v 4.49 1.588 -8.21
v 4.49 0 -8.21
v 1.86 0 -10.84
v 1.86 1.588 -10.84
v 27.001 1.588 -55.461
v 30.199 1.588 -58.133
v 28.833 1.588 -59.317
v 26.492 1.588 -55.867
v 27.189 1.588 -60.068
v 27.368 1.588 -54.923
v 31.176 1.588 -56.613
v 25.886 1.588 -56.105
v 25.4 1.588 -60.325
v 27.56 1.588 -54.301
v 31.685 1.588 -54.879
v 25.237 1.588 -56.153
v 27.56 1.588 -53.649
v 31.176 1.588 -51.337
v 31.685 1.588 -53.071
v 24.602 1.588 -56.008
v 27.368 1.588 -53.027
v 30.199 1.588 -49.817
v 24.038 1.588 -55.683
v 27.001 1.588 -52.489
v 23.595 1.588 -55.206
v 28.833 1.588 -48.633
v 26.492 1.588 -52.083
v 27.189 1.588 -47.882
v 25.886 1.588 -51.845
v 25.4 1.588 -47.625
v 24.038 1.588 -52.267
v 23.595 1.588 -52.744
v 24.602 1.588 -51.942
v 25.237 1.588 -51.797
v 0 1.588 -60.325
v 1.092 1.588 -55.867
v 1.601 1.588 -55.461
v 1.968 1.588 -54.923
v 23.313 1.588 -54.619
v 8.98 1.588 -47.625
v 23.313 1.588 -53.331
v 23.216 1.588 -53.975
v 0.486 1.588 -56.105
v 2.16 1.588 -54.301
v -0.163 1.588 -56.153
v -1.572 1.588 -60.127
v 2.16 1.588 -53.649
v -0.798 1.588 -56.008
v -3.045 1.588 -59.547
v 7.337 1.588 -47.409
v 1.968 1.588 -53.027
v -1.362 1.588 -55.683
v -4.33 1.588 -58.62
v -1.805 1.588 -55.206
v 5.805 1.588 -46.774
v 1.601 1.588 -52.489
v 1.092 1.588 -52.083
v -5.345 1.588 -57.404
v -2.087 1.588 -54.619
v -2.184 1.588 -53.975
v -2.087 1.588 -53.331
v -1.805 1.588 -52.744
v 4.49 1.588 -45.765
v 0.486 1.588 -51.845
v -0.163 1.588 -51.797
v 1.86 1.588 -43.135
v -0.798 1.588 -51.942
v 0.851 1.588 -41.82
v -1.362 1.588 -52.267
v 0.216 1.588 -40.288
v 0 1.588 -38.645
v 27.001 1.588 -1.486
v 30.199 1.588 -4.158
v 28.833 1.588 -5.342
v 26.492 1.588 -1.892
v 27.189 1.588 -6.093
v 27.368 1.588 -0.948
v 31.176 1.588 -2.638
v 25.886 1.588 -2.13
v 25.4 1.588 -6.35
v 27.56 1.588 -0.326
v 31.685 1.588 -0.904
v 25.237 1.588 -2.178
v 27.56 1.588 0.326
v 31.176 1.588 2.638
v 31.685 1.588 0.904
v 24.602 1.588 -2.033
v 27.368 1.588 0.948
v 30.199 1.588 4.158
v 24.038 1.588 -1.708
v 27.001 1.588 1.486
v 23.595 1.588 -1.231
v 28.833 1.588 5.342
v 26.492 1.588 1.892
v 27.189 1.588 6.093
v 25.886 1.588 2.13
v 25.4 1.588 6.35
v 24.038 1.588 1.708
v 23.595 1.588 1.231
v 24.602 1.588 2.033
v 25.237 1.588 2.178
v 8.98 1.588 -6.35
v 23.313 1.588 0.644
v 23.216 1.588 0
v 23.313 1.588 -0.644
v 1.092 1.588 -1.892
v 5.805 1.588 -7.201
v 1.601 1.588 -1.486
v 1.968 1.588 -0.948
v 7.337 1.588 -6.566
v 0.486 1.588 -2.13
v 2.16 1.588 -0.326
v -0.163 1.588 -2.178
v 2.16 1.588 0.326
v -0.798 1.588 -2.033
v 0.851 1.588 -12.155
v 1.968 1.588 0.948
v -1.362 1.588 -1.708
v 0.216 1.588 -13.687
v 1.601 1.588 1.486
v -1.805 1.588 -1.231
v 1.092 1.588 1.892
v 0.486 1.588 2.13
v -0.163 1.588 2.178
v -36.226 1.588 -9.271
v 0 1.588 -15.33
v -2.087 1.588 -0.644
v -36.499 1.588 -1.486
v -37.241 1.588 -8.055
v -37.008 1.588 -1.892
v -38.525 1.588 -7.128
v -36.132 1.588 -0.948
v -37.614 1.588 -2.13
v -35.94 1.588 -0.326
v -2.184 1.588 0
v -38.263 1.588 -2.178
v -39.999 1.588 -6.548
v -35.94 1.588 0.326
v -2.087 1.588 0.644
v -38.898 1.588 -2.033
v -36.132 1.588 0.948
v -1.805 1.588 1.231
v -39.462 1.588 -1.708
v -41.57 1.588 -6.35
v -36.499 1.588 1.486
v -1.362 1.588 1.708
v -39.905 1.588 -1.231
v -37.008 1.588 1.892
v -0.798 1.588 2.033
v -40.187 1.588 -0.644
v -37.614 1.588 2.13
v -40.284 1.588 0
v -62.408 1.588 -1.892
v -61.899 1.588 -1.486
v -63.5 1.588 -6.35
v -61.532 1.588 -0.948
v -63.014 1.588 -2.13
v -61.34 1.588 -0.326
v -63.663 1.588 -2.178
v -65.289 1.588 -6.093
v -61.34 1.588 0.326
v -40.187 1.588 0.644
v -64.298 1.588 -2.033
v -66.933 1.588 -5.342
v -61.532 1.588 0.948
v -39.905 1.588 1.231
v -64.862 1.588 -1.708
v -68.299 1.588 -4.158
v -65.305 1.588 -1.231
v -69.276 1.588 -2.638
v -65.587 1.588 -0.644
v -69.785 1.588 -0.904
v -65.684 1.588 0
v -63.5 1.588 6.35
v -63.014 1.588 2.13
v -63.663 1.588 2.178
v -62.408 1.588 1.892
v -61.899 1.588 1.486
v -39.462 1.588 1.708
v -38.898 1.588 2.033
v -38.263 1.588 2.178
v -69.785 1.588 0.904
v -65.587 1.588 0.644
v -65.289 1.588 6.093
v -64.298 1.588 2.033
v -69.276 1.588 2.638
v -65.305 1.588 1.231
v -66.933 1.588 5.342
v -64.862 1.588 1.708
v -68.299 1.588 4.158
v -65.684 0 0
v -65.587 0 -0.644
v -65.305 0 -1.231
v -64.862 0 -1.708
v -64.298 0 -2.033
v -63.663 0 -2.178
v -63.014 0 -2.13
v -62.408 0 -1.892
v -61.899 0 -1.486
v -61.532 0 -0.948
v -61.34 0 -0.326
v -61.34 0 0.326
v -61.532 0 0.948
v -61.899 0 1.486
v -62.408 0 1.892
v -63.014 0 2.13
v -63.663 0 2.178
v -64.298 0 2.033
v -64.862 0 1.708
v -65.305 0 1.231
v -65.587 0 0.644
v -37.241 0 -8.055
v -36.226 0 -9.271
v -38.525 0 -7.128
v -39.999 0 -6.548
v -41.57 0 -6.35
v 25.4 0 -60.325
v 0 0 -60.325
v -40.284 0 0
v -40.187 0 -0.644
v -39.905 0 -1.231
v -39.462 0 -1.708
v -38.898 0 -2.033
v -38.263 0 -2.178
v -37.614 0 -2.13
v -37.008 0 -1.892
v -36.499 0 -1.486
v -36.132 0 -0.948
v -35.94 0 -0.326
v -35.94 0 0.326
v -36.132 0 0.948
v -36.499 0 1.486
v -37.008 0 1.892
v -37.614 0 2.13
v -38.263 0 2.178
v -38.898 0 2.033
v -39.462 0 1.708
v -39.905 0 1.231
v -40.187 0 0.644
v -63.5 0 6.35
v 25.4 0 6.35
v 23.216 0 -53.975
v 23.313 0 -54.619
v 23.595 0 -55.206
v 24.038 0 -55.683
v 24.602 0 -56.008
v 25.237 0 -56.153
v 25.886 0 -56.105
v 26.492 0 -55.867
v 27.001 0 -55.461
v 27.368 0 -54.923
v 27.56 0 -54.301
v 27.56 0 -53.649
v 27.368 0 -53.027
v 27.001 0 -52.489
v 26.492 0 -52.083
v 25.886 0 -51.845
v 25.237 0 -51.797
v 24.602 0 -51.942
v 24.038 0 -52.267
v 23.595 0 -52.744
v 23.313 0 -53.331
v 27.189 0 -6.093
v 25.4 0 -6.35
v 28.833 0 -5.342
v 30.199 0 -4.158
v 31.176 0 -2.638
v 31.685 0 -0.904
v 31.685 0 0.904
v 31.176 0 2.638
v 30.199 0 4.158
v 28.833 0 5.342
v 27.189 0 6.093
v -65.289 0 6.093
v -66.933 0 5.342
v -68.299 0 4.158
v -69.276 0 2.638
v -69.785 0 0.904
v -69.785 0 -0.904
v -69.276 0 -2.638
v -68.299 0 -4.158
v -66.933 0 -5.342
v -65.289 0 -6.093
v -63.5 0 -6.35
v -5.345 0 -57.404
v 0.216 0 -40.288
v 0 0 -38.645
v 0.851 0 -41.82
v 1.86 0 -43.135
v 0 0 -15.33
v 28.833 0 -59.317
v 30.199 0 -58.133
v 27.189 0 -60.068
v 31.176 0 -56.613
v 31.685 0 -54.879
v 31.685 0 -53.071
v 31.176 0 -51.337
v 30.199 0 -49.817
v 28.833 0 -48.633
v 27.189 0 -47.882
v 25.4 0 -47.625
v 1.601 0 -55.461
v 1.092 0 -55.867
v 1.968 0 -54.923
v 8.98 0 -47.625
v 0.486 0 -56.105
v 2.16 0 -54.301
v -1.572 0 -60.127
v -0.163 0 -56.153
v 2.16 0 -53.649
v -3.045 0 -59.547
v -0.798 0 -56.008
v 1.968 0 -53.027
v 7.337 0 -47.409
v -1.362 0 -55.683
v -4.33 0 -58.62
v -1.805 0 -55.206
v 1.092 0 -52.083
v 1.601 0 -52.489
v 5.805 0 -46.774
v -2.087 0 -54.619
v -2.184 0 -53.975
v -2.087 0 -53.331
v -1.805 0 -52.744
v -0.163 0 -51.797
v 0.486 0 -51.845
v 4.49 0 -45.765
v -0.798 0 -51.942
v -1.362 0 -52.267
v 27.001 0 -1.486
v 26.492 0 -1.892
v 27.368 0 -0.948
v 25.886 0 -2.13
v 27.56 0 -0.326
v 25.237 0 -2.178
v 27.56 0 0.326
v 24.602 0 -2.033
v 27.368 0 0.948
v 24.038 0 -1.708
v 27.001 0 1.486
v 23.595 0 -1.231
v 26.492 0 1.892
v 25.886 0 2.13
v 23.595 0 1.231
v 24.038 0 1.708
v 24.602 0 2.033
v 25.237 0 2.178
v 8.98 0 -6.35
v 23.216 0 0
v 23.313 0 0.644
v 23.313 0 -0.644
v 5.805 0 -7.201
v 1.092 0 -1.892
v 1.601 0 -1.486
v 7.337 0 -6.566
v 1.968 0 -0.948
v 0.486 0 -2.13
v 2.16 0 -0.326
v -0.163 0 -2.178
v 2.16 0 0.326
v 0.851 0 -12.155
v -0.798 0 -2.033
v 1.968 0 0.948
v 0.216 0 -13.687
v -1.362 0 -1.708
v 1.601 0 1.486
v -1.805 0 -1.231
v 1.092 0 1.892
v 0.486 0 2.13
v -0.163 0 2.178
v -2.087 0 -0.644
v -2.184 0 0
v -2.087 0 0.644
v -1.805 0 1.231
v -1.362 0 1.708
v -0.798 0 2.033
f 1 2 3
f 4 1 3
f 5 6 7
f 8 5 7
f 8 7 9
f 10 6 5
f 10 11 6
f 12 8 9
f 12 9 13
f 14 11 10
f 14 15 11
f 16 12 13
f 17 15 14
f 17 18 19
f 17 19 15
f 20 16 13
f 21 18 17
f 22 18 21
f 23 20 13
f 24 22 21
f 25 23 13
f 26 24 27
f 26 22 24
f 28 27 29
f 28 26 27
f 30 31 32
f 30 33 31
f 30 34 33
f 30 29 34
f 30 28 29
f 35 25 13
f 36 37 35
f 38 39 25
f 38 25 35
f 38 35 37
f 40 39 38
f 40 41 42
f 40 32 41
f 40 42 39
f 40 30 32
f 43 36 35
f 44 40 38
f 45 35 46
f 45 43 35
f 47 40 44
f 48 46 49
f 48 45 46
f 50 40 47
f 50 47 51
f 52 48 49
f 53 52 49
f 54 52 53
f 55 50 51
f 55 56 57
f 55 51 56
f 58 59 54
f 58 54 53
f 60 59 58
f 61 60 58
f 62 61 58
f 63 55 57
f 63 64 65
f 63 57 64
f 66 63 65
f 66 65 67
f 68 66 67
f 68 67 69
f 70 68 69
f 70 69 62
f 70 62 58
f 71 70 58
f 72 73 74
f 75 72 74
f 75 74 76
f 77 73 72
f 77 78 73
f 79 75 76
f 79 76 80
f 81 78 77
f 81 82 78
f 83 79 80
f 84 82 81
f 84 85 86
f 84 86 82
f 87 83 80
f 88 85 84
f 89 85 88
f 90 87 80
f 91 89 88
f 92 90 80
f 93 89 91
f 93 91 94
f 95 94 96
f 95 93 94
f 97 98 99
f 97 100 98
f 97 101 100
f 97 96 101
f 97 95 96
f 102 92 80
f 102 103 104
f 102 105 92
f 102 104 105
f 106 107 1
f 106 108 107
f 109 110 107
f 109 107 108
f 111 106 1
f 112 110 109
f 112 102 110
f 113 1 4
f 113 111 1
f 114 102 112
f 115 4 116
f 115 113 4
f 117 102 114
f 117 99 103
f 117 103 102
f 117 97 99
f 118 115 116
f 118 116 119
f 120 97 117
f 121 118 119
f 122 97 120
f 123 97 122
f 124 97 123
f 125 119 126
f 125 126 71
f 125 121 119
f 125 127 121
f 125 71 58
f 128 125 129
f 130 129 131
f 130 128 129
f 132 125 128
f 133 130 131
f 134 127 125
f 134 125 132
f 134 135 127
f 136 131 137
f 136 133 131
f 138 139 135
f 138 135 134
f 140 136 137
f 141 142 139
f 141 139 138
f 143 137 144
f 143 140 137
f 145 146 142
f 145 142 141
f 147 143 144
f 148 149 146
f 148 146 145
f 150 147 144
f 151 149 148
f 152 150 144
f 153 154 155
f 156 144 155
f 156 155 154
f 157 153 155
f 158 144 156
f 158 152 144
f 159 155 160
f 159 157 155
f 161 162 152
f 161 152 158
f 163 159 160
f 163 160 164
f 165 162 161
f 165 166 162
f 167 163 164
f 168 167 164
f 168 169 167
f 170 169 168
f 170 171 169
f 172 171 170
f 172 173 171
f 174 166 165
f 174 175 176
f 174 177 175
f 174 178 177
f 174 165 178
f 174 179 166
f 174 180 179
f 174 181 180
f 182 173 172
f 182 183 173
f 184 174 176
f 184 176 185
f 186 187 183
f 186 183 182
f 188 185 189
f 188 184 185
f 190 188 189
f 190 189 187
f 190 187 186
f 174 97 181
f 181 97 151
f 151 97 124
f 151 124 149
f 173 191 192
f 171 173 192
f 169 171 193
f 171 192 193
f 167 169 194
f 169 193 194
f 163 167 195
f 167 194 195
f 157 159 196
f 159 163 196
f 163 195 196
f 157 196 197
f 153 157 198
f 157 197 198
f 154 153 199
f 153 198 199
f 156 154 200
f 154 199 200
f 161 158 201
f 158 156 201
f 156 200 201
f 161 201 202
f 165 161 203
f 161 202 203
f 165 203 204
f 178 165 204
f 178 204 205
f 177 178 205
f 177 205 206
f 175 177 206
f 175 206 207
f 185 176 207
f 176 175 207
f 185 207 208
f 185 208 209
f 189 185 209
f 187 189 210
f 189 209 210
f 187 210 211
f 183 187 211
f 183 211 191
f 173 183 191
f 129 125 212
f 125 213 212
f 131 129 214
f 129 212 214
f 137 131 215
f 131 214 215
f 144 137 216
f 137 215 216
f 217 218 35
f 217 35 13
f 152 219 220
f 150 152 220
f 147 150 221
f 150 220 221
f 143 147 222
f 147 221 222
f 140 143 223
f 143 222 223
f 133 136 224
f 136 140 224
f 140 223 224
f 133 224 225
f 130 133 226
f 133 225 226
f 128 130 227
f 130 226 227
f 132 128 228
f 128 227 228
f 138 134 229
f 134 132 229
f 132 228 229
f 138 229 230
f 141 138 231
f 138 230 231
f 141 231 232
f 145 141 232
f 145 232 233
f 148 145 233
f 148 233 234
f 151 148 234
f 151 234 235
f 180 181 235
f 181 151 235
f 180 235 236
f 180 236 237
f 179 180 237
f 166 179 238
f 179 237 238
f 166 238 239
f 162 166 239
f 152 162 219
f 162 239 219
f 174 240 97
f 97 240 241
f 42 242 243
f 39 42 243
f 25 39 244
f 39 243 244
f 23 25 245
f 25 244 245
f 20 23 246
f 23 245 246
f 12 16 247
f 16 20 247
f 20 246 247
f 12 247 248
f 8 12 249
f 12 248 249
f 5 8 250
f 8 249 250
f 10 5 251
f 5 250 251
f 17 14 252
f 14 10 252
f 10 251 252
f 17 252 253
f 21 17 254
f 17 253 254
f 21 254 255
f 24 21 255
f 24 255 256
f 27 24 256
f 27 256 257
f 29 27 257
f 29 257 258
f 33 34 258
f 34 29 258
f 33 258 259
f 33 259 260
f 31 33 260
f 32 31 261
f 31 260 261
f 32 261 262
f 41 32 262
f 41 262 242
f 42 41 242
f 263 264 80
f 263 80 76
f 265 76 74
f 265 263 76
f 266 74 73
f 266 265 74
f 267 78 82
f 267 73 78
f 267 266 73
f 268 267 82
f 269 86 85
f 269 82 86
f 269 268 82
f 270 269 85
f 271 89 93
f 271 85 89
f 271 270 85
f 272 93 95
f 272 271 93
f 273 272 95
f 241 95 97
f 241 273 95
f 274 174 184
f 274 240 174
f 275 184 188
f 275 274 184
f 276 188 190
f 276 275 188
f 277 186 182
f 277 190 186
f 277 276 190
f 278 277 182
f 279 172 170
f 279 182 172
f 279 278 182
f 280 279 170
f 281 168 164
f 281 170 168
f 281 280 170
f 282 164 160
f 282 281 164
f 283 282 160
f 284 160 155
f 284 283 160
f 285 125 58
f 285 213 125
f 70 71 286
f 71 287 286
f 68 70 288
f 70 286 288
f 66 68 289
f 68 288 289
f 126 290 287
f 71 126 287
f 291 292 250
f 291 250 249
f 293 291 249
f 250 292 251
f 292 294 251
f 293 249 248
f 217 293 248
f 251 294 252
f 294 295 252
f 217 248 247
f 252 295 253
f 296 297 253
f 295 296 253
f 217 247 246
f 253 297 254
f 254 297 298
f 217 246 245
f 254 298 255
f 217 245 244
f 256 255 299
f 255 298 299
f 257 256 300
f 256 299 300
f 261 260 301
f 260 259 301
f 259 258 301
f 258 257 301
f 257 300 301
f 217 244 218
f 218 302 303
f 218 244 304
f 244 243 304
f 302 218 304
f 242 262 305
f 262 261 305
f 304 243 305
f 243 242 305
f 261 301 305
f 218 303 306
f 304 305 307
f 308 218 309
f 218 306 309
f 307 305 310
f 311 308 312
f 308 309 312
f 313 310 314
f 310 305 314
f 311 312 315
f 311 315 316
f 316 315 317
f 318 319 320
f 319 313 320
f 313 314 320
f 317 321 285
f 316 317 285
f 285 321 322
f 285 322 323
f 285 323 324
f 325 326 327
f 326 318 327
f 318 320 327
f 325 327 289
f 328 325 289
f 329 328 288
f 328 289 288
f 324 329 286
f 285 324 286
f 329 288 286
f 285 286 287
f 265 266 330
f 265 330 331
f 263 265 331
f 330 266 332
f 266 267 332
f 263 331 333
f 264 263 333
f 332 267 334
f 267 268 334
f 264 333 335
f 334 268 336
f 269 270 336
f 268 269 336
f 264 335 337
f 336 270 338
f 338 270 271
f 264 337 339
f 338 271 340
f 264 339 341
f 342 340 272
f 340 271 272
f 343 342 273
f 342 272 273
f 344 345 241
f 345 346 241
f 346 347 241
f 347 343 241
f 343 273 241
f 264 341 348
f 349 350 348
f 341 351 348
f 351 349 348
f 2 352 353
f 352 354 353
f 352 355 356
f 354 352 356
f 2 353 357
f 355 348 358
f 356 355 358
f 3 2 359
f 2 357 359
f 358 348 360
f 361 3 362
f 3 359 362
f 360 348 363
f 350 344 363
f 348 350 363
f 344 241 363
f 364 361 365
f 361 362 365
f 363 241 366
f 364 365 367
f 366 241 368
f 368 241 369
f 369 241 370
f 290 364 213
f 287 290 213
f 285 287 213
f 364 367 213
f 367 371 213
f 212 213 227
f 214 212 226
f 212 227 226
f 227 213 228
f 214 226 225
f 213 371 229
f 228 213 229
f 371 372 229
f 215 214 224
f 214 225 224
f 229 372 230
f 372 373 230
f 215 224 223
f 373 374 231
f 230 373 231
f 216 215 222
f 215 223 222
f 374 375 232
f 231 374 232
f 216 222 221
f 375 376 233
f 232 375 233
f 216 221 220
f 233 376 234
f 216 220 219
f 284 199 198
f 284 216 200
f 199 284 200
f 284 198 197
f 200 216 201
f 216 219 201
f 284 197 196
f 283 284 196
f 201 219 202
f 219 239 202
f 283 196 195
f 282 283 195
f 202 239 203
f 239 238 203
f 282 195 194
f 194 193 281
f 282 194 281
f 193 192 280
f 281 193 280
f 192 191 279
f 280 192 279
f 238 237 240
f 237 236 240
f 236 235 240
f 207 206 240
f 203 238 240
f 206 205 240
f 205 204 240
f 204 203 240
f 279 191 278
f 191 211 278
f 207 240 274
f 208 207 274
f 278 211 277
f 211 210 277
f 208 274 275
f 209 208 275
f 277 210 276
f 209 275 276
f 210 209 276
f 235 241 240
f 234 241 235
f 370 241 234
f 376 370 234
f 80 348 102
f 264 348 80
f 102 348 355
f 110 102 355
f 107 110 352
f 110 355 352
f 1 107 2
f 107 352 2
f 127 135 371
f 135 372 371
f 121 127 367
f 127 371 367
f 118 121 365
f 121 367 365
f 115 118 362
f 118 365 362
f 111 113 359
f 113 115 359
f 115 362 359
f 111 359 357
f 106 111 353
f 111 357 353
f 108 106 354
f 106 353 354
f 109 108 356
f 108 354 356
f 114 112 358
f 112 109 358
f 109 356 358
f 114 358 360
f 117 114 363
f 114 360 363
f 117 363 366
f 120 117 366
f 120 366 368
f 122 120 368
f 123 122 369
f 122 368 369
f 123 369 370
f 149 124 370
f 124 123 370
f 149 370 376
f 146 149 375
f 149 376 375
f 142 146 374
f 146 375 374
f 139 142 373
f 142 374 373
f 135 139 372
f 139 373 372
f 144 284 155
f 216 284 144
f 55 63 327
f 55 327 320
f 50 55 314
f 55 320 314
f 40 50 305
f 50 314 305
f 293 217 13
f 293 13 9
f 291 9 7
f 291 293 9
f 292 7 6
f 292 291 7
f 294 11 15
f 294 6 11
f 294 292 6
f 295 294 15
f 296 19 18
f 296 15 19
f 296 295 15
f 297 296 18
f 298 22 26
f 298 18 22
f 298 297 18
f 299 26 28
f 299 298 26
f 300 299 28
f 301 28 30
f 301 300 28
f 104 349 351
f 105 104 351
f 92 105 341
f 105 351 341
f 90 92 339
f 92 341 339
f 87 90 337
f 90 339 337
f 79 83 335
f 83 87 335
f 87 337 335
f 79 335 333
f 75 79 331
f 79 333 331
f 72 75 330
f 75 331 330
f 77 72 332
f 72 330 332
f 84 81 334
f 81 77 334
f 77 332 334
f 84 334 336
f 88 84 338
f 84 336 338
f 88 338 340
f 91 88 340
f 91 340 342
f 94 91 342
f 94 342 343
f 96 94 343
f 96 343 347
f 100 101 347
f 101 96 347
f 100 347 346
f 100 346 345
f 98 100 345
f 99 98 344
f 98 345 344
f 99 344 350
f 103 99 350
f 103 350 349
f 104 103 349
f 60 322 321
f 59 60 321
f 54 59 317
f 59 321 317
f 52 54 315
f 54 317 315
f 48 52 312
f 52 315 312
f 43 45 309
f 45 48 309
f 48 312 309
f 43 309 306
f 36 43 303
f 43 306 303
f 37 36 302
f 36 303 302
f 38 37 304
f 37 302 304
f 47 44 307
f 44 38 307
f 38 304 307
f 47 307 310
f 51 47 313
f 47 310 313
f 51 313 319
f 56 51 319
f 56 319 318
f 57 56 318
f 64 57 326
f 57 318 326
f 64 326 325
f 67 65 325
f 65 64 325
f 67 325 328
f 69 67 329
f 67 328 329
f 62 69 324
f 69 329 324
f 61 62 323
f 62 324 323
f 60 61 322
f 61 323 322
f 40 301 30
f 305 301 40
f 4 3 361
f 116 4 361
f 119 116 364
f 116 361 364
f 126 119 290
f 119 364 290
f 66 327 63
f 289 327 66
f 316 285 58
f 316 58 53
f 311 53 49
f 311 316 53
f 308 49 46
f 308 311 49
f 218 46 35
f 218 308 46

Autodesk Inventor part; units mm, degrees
ref_plane "YZ Plane" through (0, 0, 0) normal (1, 0, 0) x (0, 1, 0)
ref_plane "XZ Plane" through (0, 0, 0) normal (0, 1, 0) x (-1, 0, 0)
ref_plane "XY Plane" through (0, 0, 0) normal (0, 0, 1) x (1, 0, 0)
sketch "main" plane through (0, 0, 0) normal (0, 0, 1) x (1, 0, 0)
  circle A0 centre (-18.4512, -23.1863) radius 2.1844
  line L0 (-22.9413, -14.9764) -> (-20.311, -12.3462)
  line L1 (-43.8512, -16.8363) -> (-27.4314, -16.8363)
  arc A1 (-27.4314, -16.8363) -> (-22.9413, -14.9764) centre (-27.4314, -10.4863) ccw
  circle A2 centre (-43.8512, -23.1863) radius 2.1844
  arc A3 (-43.8512, -16.8363) -> (-43.8512, -29.5363) centre (-43.8512, -23.1863) ccw
  arc A4 (-20.311, -12.3462) -> (-18.4512, -7.856) centre (-24.8012, -7.856) ccw
  line L2 (-18.4512, 15.4585) -> (-18.4512, -7.856)
  line L3 (17.7748, 21.5177) -> (-13.1066, -26.6153)
  arc A5 (-18.4512, 15.4585) -> (-20.311, 19.9486) centre (-24.8012, 15.4585) ccw
  line L4 (-22.9413, 22.5788) -> (-20.311, 19.9486)
  arc A6 (-22.9413, 22.5788) -> (-27.4314, 24.4387) centre (-27.4314, 18.0887) ccw
  circle A7 centre (-43.8512, 30.7887) radius 2.1844
  circle A8 centre (-18.4512, 30.7887) radius 2.1844
  circle A9 centre (19.6488, 30.7887) radius 2.1844
  line L5 (45.0488, 37.1387) -> (-43.8512, 37.1387)
  line L6 (-27.4314, 24.4387) -> (-43.8512, 24.4387)
  arc A10 (-43.8512, 37.1387) -> (-43.8512, 24.4387) centre (-43.8512, 30.7887) ccw
  arc A11 (23.1193, 24.4387) -> (17.7748, 21.5177) centre (23.1193, 18.0887) ccw
  line L7 (45.0488, 24.4387) -> (23.1193, 24.4387)
  circle A12 centre (45.0488, 30.7887) radius 2.1844
  arc A13 (45.0488, 24.4387) -> (45.0488, 37.1387) centre (45.0488, 30.7887) ccw
  line L8 (-18.4512, -29.5363) -> (-43.8512, -29.5363)
  arc A14 (-18.4512, -29.5363) -> (-13.1066, -26.6153) centre (-18.4512, -23.1863) ccw
  point P0 (-14.0637, 6.8091)
  dimension "d0" = 6.35
  dimension "d1" = 6.35
sketch "Sketch1" plane through (0, 0, 0) normal (0, 1, 0) x (-1, 0, 0)
  circle A0 centre (0, -53.975) radius 2.1844
  line L0 (-4.4901, -45.7651) -> (-1.8599, -43.1349)
  line L1 (-25.4, -47.625) -> (-8.9803, -47.625)
  arc A1 (-8.9803, -47.625) -> (-4.4901, -45.7651) centre (-8.9803, -41.275) ccw
  circle A2 centre (-25.4, -53.975) radius 2.1844
  arc A3 (-25.4, -47.625) -> (-25.4, -60.325) centre (-25.4, -53.975) ccw
  arc A4 (-1.8599, -43.1349) -> (0, -38.6447) centre (-6.35, -38.6447) ccw
  line L2 (0, -15.3303) -> (0, -38.6447)
  line L3 (36.2259, -9.271) -> (5.3446, -57.404)
  arc A5 (0, -15.3303) -> (-1.8599, -10.8401) centre (-6.35, -15.3303) ccw
  line L4 (-4.4901, -8.2099) -> (-1.8599, -10.8401)
  arc A6 (-4.4901, -8.2099) -> (-8.9803, -6.35) centre (-8.9803, -12.7) ccw
  circle A7 centre (-25.4, 0) radius 2.1844
  circle A8 centre (0, 0) radius 2.1844
  circle A9 centre (38.1, 0) radius 2.1844
  line L5 (63.5, 6.35) -> (-25.4, 6.35)
  line L6 (-8.9803, -6.35) -> (-25.4, -6.35)
  arc A10 (-25.4, 6.35) -> (-25.4, -6.35) centre (-25.4, 0) ccw
  arc A11 (41.5705, -6.35) -> (36.2259, -9.271) centre (41.5705, -12.7) ccw
  line L7 (63.5, -6.35) -> (41.5705, -6.35)
  circle A12 centre (63.5, 0) radius 2.1844
  arc A13 (63.5, -6.35) -> (63.5, 6.35) centre (63.5, 0) ccw
  line L8 (0, -60.325) -> (-25.4, -60.325)
  arc A14 (0, -60.325) -> (5.3446, -57.404) centre (0, -53.975) ccw
extrude "Extrusion1" add sketch "Sketch1" along normal blind 1.5875
properties part number "gusset" material "Acetal Resin, White"
